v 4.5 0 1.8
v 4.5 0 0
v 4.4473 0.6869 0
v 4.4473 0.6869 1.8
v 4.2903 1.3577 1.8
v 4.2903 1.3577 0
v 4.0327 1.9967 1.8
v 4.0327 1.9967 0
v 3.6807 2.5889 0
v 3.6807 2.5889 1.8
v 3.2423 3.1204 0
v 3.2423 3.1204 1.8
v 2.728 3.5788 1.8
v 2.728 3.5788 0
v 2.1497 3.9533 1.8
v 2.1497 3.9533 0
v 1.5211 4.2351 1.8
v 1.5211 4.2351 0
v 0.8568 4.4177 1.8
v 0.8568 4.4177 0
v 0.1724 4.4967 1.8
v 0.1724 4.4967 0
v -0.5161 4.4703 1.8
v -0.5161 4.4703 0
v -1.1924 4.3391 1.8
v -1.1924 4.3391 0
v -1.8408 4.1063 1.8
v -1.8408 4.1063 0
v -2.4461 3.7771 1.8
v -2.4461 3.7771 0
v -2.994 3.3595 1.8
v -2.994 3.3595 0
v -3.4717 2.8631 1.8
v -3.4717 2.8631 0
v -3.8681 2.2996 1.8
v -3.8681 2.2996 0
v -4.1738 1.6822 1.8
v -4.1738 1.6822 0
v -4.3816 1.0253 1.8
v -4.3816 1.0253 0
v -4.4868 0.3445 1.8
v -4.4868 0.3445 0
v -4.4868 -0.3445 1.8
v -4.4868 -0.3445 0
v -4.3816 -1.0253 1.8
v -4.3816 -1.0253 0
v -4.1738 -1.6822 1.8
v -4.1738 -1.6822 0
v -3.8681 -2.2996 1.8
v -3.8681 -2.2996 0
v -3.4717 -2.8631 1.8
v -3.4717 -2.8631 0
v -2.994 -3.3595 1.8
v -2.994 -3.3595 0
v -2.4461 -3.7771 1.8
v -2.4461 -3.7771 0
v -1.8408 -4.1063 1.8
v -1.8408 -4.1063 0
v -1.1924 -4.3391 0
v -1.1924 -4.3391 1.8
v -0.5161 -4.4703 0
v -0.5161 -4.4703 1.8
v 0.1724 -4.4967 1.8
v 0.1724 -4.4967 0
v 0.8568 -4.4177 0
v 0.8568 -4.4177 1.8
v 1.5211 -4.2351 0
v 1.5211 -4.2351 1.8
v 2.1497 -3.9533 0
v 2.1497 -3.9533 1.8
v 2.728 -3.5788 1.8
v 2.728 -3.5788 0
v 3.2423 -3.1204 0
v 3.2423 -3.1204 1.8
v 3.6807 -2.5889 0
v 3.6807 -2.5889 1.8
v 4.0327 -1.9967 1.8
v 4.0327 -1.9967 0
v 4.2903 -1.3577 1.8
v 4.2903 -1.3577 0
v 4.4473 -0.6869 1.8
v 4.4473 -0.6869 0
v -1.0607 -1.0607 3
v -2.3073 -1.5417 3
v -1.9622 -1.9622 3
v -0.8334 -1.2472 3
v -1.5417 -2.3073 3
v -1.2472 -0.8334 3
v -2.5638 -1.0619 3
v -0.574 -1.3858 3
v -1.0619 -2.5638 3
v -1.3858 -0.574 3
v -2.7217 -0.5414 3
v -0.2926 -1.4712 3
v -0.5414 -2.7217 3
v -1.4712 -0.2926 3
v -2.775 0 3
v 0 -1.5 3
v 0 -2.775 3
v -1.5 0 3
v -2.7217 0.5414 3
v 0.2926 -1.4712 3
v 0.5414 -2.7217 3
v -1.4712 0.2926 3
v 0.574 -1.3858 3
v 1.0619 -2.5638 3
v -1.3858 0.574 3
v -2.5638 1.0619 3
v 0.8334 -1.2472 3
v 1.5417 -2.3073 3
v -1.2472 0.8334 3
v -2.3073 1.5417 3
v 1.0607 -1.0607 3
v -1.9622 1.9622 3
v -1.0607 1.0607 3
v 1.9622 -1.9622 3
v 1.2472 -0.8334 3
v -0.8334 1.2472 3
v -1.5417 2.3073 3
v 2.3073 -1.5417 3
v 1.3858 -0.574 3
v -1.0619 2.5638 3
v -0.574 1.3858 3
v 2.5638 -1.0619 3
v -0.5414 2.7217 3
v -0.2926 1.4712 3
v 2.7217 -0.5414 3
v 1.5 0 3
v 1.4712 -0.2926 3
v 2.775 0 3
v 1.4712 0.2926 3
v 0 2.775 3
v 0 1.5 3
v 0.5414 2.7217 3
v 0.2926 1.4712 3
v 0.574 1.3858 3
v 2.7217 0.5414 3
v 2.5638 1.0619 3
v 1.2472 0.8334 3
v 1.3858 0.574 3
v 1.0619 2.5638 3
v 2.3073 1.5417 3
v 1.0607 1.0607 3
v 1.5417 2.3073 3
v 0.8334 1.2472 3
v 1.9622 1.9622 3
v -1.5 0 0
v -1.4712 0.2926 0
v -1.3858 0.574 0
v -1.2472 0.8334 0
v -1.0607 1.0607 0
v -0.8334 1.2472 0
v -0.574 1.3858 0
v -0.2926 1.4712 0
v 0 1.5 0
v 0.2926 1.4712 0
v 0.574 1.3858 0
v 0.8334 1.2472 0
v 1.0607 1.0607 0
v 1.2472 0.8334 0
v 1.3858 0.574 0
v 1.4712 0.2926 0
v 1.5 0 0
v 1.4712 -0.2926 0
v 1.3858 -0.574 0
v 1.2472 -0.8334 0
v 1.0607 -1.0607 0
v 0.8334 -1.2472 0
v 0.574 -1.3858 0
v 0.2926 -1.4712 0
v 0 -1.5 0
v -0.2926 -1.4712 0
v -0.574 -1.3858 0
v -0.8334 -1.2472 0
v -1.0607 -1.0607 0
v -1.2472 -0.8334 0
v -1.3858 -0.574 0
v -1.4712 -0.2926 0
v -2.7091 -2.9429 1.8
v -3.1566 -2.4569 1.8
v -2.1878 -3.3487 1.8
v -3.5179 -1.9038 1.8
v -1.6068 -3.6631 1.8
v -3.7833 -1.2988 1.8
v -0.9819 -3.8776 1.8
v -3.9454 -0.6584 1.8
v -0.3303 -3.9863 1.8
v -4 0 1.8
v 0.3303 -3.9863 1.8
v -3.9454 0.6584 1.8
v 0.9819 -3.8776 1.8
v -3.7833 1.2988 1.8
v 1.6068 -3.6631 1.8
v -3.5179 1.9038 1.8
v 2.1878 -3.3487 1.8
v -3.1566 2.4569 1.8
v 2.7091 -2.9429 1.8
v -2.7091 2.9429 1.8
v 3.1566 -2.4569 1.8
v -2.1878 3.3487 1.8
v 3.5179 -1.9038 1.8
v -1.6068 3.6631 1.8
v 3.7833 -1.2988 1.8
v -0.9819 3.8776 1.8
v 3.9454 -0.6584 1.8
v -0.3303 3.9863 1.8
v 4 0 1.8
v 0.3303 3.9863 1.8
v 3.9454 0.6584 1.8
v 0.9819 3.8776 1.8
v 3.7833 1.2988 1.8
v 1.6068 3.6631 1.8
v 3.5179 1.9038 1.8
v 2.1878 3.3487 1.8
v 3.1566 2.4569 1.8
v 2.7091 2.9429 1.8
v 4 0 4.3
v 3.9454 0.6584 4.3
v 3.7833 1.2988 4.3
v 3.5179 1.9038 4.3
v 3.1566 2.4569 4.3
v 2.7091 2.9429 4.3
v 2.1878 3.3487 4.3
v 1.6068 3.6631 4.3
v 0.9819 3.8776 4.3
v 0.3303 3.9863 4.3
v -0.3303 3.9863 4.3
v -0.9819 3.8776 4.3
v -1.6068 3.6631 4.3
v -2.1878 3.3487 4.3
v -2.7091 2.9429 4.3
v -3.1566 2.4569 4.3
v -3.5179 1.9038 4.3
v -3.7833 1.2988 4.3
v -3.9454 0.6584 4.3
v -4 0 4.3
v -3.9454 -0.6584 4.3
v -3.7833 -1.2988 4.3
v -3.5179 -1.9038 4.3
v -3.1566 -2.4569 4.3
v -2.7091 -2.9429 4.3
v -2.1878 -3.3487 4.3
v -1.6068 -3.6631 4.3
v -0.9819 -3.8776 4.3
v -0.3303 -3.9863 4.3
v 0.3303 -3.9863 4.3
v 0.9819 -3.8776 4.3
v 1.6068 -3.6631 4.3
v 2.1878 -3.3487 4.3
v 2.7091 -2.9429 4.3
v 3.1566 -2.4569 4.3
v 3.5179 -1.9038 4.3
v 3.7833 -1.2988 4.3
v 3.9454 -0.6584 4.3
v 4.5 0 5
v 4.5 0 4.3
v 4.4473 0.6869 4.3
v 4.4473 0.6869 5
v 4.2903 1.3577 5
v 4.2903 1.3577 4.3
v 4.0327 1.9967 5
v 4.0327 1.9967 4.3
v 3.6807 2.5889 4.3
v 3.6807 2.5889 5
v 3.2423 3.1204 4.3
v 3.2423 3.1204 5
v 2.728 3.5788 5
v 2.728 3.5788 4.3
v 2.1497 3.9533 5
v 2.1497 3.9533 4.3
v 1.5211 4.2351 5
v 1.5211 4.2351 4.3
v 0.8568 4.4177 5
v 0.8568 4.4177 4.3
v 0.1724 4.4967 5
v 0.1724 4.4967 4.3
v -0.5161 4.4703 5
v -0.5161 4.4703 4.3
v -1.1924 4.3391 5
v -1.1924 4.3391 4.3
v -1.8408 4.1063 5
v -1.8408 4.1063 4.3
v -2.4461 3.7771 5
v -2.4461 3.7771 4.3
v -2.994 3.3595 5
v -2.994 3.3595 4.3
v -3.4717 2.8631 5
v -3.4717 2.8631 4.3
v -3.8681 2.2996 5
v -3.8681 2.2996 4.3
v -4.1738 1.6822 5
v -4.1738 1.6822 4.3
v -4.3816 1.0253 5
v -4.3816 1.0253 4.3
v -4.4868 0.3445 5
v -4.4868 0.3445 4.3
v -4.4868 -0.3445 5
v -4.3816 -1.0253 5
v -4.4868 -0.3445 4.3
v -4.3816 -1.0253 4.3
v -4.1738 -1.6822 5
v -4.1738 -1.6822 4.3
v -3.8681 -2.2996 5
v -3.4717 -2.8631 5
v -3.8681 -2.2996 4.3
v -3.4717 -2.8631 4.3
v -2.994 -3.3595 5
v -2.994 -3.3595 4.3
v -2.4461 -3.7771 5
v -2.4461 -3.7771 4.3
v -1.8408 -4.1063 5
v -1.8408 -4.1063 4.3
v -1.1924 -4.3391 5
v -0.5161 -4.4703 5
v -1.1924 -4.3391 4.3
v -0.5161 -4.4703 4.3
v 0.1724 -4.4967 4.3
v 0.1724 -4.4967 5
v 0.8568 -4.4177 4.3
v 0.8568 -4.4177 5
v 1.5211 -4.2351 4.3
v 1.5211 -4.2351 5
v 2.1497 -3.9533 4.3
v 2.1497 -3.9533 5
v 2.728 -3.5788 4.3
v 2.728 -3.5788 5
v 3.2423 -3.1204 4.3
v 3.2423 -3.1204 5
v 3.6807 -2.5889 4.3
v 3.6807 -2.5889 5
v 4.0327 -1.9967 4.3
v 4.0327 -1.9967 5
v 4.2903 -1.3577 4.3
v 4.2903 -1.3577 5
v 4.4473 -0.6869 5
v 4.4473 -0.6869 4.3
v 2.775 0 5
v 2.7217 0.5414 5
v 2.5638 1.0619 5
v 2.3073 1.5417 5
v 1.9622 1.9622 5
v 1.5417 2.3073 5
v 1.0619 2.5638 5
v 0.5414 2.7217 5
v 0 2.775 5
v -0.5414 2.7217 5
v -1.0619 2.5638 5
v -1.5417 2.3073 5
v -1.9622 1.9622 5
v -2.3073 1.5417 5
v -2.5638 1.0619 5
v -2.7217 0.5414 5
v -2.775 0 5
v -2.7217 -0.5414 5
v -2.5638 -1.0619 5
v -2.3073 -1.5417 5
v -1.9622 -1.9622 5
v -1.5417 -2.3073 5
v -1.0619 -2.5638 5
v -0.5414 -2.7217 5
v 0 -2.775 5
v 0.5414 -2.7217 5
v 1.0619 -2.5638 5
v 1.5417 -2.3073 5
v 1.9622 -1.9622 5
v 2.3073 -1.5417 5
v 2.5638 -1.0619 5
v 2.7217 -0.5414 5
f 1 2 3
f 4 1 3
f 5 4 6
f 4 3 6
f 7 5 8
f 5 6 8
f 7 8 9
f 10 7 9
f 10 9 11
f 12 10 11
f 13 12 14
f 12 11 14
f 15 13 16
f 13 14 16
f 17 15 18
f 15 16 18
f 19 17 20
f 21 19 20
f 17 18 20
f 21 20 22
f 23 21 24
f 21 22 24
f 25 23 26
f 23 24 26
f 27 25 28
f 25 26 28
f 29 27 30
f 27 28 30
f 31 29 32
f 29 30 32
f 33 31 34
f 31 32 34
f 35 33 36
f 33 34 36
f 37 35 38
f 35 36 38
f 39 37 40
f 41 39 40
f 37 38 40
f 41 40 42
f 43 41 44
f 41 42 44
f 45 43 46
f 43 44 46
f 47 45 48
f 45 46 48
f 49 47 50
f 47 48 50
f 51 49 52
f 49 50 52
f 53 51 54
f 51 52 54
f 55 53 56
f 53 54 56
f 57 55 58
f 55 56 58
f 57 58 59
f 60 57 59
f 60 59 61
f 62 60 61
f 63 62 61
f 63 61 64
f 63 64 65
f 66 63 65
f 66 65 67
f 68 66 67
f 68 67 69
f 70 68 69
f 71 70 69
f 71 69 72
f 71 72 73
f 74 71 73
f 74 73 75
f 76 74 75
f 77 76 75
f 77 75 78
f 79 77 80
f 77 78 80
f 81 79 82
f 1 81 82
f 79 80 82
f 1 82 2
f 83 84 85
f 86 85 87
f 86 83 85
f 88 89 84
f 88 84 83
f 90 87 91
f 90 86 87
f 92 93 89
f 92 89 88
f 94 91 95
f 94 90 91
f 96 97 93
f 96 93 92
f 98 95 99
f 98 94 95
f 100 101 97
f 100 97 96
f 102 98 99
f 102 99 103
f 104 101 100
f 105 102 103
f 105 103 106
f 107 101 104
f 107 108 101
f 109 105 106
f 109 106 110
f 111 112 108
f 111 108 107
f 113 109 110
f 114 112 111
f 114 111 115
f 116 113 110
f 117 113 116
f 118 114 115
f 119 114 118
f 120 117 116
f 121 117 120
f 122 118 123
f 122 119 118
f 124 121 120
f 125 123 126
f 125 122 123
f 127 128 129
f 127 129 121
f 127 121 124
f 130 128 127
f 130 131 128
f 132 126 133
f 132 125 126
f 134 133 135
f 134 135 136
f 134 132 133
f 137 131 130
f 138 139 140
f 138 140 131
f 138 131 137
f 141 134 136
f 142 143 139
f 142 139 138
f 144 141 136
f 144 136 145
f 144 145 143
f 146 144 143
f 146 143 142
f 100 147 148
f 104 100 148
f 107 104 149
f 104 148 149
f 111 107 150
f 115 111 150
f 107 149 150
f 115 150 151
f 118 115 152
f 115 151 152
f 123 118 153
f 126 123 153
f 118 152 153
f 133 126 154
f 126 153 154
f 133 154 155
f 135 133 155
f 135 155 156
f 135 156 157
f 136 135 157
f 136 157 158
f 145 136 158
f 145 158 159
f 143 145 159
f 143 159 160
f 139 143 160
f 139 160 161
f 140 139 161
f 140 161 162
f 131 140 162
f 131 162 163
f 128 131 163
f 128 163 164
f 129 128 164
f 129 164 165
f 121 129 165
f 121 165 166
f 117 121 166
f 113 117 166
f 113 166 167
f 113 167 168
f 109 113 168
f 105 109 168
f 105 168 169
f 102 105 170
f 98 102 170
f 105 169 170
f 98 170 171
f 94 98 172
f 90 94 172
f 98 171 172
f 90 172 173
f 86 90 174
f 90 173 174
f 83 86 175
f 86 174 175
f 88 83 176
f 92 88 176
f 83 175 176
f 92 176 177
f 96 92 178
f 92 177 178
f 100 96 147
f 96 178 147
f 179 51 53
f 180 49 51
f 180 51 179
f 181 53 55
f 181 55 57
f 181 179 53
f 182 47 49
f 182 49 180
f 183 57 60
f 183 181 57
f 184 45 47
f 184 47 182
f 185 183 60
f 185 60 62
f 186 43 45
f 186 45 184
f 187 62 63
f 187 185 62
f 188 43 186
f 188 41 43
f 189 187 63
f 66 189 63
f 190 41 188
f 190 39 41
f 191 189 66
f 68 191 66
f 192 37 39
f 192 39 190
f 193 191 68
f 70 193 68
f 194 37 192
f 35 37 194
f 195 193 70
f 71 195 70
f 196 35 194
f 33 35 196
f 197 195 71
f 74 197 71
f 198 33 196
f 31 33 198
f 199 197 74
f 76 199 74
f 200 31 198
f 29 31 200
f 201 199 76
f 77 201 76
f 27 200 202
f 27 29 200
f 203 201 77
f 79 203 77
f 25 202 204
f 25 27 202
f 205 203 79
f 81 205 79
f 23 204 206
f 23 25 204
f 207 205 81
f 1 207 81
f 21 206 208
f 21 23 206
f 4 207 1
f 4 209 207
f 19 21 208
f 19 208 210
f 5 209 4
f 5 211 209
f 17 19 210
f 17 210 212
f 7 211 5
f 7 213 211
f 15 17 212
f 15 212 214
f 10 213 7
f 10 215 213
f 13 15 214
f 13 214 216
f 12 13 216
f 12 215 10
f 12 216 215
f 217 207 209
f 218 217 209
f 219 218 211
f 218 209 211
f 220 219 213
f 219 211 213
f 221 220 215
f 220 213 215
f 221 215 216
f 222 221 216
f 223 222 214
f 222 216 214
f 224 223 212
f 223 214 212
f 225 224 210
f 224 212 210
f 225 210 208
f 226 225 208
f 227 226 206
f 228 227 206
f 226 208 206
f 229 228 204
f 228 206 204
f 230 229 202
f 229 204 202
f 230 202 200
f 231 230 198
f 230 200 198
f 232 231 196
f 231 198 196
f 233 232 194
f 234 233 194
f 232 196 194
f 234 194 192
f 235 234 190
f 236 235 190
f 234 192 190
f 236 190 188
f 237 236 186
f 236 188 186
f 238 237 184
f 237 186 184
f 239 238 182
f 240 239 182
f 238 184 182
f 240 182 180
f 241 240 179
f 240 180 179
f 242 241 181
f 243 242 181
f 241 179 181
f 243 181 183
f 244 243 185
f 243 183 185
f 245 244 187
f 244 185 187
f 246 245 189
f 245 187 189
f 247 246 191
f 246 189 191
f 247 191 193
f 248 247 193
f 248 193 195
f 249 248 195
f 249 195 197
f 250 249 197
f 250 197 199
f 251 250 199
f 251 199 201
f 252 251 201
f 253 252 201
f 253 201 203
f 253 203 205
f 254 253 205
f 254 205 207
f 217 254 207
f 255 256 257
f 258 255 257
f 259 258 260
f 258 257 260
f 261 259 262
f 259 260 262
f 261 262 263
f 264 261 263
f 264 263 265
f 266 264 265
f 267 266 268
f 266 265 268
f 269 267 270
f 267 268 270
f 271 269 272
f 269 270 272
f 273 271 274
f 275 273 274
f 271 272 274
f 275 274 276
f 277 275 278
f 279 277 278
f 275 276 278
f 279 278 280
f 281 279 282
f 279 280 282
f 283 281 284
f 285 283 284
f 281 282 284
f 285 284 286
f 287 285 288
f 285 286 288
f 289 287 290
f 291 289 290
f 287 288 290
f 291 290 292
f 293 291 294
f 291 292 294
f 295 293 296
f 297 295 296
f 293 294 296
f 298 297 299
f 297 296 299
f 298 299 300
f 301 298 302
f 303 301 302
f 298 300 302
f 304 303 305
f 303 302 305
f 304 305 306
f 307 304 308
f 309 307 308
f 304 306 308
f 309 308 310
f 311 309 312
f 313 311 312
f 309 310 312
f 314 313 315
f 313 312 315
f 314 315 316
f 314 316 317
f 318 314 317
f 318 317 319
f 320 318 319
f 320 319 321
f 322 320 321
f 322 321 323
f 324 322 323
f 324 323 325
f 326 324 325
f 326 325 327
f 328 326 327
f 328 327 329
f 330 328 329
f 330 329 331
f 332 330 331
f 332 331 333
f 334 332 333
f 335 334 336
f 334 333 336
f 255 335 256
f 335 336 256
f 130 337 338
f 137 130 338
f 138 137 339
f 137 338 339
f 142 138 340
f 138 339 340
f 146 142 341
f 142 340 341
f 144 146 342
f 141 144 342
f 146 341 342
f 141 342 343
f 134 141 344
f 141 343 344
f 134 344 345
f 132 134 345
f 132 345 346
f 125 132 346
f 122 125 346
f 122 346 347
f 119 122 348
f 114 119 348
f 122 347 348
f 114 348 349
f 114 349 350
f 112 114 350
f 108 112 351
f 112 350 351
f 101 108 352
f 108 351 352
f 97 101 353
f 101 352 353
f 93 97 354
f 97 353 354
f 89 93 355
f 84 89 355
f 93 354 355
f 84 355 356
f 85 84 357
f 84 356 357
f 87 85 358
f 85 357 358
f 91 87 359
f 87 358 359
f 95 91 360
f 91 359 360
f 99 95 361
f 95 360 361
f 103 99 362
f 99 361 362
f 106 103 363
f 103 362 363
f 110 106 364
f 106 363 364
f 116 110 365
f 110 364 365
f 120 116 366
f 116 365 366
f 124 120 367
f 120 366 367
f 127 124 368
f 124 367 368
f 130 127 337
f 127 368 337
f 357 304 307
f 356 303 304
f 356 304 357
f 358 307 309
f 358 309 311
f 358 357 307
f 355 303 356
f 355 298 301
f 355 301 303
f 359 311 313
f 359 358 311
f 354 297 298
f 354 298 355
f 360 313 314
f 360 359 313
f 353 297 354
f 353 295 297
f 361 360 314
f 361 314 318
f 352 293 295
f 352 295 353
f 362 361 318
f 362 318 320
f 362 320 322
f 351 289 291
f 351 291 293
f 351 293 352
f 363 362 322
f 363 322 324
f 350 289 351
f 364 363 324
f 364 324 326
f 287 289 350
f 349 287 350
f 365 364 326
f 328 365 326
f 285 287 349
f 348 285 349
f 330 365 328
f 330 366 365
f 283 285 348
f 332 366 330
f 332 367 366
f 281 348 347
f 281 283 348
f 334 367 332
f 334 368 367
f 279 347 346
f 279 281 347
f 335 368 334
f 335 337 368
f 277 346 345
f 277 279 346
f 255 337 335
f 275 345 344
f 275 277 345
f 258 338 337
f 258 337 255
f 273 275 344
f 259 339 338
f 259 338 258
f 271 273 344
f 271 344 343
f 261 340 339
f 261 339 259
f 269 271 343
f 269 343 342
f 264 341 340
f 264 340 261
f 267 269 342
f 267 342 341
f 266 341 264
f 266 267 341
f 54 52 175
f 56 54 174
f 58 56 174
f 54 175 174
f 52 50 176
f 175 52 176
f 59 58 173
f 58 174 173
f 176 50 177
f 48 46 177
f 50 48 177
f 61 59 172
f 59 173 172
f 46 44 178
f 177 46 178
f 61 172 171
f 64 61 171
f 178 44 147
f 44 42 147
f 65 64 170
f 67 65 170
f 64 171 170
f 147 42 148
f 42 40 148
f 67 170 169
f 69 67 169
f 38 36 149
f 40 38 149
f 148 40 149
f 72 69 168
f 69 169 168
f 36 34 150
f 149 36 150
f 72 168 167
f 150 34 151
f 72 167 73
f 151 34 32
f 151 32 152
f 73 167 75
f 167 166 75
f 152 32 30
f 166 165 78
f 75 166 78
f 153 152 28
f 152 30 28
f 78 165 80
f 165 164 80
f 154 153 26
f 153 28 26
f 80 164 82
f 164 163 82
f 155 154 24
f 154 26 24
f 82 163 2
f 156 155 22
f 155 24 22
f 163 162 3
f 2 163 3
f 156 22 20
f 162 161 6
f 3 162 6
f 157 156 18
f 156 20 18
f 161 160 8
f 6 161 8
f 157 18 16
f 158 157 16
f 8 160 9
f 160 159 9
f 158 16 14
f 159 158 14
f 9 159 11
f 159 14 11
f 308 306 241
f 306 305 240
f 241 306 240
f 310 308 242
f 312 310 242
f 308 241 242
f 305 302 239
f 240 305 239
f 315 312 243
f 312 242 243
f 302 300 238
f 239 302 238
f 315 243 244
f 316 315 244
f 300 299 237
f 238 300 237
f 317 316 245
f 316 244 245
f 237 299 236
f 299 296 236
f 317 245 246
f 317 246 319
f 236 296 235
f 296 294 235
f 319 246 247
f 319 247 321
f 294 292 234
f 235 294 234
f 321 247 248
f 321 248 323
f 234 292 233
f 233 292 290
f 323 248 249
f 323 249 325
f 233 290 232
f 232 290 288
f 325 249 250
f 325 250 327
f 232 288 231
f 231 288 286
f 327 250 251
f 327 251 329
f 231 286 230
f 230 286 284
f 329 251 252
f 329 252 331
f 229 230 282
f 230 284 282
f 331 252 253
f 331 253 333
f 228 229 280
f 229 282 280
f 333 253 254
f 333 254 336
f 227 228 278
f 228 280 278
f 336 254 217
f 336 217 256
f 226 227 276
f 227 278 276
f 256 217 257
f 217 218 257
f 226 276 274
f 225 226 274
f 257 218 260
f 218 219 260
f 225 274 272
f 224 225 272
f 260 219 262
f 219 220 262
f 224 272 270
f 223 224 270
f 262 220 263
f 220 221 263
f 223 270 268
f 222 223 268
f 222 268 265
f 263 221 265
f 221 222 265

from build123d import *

# Parameters (mm, degrees)
BASE_R                   = 4.5
BODY_1_DEPTH             = 1.8
THIN_BASE_R              = 4
BODY_THIN_DEPTH          = 2.5
BASE_2_R                 = 4.5
BODY_2_DEPTH             = 0.7
SCREW_HEAD_HOLE_SKETCH_R = 2.775
SCREW_HEAD_HOLE_DEPTH    = 2
F_3_0_3_DIAMETER_HOLE1_D = 3


with BuildPart() as part:
    # base → body 1 (new body)
    with BuildSketch(Plane.XY):
        Circle(BASE_R)
    extrude(amount=BODY_1_DEPTH)

    # thin base → body thin (add)
    with BuildSketch(Plane.XY.offset(1.8)):
        Circle(THIN_BASE_R)
    extrude(amount=BODY_THIN_DEPTH)

    # base 2 → body 2 (add)
    with BuildSketch(Plane.XY.offset(4.3)):
        Circle(BASE_2_R)
    extrude(amount=BODY_2_DEPTH)

    # screw head hole sketch → screw head hole (cut)
    with BuildSketch(Plane.XY.offset(5)):
        Circle(SCREW_HEAD_HOLE_SKETCH_R)
    extrude(amount=-SCREW_HEAD_HOLE_DEPTH, mode=Mode.SUBTRACT)

    # Ø3.0 (3) Diameter Hole1 (through all)
    with Locations(Plane.XY.offset(3)):
        with Locations((0, 0)):
            Hole(F_3_0_3_DIAMETER_HOLE1_D / 2)


solid = part.part
